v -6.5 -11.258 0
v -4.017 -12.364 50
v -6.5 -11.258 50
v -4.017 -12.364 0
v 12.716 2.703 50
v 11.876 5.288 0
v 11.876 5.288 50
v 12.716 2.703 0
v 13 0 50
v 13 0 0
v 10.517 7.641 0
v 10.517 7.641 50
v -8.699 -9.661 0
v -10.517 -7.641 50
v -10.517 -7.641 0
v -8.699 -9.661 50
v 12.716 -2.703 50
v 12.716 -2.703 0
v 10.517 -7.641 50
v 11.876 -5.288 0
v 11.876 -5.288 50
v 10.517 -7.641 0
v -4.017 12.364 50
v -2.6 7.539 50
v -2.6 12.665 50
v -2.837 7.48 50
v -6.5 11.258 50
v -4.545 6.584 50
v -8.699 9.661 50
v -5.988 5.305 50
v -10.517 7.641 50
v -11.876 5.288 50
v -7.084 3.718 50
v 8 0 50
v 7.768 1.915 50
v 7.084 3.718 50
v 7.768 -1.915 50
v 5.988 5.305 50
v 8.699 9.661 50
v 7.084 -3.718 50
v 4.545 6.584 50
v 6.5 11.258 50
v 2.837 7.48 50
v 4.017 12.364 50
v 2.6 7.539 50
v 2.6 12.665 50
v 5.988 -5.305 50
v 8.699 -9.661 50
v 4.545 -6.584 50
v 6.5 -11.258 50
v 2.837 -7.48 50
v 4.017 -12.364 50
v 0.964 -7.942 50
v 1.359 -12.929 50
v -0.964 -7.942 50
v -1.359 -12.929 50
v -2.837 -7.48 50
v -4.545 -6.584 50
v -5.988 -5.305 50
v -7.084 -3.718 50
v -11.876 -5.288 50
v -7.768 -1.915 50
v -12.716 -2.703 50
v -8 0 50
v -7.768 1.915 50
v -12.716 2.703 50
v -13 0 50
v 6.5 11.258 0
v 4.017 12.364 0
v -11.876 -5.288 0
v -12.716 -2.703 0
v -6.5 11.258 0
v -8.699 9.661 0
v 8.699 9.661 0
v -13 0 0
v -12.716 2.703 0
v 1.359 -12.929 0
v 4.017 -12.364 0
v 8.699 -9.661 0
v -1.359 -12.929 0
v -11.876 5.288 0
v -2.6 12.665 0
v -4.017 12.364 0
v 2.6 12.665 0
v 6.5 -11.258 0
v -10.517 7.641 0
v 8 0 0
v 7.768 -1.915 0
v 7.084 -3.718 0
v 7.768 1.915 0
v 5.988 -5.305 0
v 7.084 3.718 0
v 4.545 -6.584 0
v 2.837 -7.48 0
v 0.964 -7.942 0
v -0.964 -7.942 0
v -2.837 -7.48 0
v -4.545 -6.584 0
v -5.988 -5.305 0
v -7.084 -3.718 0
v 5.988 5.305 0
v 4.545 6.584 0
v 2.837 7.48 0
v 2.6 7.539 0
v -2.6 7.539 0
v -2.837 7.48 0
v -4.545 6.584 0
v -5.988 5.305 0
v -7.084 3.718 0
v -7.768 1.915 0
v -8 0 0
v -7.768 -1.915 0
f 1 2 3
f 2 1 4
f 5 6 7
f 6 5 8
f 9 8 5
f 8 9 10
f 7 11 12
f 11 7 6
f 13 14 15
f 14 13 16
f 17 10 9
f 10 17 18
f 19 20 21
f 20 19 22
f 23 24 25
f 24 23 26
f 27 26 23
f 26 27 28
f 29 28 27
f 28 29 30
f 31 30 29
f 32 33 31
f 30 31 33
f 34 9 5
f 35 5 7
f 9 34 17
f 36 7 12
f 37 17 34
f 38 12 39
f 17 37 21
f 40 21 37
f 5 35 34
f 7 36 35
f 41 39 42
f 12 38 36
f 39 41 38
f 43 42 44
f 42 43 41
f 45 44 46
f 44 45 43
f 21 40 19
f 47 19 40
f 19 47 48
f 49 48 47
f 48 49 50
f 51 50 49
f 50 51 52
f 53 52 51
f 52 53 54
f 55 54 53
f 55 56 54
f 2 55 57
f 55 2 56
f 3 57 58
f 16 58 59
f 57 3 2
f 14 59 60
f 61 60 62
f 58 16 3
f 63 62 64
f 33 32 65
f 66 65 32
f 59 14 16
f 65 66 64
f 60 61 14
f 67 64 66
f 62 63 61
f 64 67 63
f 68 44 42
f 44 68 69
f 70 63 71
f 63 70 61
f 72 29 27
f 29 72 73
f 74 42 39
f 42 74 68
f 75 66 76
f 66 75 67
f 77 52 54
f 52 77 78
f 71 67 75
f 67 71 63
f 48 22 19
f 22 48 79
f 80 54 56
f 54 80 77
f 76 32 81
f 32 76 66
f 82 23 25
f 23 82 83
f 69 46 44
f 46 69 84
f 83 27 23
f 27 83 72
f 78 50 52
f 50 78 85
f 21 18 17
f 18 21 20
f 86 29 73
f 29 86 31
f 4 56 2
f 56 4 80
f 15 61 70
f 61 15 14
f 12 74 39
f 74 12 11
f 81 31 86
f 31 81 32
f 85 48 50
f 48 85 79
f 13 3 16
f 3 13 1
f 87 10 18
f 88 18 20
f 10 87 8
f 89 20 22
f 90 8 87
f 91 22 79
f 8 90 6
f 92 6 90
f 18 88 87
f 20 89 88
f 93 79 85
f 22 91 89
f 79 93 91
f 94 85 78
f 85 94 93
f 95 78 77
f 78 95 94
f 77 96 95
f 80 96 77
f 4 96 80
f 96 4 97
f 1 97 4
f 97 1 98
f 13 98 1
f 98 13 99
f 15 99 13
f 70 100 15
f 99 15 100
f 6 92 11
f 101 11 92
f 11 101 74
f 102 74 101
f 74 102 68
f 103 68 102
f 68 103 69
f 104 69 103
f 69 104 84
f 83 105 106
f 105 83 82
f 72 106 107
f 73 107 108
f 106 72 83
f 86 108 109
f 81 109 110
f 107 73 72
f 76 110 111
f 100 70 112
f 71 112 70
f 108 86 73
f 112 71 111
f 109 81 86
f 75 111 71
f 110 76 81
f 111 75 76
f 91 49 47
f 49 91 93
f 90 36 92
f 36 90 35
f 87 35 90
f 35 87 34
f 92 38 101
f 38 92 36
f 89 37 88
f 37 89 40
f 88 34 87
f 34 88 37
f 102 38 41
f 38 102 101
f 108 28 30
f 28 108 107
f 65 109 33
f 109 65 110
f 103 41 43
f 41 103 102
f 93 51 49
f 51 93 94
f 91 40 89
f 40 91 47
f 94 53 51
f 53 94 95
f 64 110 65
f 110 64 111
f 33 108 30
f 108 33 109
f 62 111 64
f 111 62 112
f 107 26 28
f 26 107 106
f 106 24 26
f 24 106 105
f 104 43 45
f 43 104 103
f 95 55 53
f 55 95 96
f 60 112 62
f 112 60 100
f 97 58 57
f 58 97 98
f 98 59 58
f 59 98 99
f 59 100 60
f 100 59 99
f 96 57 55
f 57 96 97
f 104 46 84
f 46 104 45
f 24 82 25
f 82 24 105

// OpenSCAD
padding = 5;
id = 16;
od = id+2*padding;

l = 50;


cutout = od*0.2;

difference() {
cylinder(d=od, h=l);
cylinder(d=id, h=l);
translate([-0.5*cutout, 0, 0]) cube([cutout, 0.5*od, l]);
}
